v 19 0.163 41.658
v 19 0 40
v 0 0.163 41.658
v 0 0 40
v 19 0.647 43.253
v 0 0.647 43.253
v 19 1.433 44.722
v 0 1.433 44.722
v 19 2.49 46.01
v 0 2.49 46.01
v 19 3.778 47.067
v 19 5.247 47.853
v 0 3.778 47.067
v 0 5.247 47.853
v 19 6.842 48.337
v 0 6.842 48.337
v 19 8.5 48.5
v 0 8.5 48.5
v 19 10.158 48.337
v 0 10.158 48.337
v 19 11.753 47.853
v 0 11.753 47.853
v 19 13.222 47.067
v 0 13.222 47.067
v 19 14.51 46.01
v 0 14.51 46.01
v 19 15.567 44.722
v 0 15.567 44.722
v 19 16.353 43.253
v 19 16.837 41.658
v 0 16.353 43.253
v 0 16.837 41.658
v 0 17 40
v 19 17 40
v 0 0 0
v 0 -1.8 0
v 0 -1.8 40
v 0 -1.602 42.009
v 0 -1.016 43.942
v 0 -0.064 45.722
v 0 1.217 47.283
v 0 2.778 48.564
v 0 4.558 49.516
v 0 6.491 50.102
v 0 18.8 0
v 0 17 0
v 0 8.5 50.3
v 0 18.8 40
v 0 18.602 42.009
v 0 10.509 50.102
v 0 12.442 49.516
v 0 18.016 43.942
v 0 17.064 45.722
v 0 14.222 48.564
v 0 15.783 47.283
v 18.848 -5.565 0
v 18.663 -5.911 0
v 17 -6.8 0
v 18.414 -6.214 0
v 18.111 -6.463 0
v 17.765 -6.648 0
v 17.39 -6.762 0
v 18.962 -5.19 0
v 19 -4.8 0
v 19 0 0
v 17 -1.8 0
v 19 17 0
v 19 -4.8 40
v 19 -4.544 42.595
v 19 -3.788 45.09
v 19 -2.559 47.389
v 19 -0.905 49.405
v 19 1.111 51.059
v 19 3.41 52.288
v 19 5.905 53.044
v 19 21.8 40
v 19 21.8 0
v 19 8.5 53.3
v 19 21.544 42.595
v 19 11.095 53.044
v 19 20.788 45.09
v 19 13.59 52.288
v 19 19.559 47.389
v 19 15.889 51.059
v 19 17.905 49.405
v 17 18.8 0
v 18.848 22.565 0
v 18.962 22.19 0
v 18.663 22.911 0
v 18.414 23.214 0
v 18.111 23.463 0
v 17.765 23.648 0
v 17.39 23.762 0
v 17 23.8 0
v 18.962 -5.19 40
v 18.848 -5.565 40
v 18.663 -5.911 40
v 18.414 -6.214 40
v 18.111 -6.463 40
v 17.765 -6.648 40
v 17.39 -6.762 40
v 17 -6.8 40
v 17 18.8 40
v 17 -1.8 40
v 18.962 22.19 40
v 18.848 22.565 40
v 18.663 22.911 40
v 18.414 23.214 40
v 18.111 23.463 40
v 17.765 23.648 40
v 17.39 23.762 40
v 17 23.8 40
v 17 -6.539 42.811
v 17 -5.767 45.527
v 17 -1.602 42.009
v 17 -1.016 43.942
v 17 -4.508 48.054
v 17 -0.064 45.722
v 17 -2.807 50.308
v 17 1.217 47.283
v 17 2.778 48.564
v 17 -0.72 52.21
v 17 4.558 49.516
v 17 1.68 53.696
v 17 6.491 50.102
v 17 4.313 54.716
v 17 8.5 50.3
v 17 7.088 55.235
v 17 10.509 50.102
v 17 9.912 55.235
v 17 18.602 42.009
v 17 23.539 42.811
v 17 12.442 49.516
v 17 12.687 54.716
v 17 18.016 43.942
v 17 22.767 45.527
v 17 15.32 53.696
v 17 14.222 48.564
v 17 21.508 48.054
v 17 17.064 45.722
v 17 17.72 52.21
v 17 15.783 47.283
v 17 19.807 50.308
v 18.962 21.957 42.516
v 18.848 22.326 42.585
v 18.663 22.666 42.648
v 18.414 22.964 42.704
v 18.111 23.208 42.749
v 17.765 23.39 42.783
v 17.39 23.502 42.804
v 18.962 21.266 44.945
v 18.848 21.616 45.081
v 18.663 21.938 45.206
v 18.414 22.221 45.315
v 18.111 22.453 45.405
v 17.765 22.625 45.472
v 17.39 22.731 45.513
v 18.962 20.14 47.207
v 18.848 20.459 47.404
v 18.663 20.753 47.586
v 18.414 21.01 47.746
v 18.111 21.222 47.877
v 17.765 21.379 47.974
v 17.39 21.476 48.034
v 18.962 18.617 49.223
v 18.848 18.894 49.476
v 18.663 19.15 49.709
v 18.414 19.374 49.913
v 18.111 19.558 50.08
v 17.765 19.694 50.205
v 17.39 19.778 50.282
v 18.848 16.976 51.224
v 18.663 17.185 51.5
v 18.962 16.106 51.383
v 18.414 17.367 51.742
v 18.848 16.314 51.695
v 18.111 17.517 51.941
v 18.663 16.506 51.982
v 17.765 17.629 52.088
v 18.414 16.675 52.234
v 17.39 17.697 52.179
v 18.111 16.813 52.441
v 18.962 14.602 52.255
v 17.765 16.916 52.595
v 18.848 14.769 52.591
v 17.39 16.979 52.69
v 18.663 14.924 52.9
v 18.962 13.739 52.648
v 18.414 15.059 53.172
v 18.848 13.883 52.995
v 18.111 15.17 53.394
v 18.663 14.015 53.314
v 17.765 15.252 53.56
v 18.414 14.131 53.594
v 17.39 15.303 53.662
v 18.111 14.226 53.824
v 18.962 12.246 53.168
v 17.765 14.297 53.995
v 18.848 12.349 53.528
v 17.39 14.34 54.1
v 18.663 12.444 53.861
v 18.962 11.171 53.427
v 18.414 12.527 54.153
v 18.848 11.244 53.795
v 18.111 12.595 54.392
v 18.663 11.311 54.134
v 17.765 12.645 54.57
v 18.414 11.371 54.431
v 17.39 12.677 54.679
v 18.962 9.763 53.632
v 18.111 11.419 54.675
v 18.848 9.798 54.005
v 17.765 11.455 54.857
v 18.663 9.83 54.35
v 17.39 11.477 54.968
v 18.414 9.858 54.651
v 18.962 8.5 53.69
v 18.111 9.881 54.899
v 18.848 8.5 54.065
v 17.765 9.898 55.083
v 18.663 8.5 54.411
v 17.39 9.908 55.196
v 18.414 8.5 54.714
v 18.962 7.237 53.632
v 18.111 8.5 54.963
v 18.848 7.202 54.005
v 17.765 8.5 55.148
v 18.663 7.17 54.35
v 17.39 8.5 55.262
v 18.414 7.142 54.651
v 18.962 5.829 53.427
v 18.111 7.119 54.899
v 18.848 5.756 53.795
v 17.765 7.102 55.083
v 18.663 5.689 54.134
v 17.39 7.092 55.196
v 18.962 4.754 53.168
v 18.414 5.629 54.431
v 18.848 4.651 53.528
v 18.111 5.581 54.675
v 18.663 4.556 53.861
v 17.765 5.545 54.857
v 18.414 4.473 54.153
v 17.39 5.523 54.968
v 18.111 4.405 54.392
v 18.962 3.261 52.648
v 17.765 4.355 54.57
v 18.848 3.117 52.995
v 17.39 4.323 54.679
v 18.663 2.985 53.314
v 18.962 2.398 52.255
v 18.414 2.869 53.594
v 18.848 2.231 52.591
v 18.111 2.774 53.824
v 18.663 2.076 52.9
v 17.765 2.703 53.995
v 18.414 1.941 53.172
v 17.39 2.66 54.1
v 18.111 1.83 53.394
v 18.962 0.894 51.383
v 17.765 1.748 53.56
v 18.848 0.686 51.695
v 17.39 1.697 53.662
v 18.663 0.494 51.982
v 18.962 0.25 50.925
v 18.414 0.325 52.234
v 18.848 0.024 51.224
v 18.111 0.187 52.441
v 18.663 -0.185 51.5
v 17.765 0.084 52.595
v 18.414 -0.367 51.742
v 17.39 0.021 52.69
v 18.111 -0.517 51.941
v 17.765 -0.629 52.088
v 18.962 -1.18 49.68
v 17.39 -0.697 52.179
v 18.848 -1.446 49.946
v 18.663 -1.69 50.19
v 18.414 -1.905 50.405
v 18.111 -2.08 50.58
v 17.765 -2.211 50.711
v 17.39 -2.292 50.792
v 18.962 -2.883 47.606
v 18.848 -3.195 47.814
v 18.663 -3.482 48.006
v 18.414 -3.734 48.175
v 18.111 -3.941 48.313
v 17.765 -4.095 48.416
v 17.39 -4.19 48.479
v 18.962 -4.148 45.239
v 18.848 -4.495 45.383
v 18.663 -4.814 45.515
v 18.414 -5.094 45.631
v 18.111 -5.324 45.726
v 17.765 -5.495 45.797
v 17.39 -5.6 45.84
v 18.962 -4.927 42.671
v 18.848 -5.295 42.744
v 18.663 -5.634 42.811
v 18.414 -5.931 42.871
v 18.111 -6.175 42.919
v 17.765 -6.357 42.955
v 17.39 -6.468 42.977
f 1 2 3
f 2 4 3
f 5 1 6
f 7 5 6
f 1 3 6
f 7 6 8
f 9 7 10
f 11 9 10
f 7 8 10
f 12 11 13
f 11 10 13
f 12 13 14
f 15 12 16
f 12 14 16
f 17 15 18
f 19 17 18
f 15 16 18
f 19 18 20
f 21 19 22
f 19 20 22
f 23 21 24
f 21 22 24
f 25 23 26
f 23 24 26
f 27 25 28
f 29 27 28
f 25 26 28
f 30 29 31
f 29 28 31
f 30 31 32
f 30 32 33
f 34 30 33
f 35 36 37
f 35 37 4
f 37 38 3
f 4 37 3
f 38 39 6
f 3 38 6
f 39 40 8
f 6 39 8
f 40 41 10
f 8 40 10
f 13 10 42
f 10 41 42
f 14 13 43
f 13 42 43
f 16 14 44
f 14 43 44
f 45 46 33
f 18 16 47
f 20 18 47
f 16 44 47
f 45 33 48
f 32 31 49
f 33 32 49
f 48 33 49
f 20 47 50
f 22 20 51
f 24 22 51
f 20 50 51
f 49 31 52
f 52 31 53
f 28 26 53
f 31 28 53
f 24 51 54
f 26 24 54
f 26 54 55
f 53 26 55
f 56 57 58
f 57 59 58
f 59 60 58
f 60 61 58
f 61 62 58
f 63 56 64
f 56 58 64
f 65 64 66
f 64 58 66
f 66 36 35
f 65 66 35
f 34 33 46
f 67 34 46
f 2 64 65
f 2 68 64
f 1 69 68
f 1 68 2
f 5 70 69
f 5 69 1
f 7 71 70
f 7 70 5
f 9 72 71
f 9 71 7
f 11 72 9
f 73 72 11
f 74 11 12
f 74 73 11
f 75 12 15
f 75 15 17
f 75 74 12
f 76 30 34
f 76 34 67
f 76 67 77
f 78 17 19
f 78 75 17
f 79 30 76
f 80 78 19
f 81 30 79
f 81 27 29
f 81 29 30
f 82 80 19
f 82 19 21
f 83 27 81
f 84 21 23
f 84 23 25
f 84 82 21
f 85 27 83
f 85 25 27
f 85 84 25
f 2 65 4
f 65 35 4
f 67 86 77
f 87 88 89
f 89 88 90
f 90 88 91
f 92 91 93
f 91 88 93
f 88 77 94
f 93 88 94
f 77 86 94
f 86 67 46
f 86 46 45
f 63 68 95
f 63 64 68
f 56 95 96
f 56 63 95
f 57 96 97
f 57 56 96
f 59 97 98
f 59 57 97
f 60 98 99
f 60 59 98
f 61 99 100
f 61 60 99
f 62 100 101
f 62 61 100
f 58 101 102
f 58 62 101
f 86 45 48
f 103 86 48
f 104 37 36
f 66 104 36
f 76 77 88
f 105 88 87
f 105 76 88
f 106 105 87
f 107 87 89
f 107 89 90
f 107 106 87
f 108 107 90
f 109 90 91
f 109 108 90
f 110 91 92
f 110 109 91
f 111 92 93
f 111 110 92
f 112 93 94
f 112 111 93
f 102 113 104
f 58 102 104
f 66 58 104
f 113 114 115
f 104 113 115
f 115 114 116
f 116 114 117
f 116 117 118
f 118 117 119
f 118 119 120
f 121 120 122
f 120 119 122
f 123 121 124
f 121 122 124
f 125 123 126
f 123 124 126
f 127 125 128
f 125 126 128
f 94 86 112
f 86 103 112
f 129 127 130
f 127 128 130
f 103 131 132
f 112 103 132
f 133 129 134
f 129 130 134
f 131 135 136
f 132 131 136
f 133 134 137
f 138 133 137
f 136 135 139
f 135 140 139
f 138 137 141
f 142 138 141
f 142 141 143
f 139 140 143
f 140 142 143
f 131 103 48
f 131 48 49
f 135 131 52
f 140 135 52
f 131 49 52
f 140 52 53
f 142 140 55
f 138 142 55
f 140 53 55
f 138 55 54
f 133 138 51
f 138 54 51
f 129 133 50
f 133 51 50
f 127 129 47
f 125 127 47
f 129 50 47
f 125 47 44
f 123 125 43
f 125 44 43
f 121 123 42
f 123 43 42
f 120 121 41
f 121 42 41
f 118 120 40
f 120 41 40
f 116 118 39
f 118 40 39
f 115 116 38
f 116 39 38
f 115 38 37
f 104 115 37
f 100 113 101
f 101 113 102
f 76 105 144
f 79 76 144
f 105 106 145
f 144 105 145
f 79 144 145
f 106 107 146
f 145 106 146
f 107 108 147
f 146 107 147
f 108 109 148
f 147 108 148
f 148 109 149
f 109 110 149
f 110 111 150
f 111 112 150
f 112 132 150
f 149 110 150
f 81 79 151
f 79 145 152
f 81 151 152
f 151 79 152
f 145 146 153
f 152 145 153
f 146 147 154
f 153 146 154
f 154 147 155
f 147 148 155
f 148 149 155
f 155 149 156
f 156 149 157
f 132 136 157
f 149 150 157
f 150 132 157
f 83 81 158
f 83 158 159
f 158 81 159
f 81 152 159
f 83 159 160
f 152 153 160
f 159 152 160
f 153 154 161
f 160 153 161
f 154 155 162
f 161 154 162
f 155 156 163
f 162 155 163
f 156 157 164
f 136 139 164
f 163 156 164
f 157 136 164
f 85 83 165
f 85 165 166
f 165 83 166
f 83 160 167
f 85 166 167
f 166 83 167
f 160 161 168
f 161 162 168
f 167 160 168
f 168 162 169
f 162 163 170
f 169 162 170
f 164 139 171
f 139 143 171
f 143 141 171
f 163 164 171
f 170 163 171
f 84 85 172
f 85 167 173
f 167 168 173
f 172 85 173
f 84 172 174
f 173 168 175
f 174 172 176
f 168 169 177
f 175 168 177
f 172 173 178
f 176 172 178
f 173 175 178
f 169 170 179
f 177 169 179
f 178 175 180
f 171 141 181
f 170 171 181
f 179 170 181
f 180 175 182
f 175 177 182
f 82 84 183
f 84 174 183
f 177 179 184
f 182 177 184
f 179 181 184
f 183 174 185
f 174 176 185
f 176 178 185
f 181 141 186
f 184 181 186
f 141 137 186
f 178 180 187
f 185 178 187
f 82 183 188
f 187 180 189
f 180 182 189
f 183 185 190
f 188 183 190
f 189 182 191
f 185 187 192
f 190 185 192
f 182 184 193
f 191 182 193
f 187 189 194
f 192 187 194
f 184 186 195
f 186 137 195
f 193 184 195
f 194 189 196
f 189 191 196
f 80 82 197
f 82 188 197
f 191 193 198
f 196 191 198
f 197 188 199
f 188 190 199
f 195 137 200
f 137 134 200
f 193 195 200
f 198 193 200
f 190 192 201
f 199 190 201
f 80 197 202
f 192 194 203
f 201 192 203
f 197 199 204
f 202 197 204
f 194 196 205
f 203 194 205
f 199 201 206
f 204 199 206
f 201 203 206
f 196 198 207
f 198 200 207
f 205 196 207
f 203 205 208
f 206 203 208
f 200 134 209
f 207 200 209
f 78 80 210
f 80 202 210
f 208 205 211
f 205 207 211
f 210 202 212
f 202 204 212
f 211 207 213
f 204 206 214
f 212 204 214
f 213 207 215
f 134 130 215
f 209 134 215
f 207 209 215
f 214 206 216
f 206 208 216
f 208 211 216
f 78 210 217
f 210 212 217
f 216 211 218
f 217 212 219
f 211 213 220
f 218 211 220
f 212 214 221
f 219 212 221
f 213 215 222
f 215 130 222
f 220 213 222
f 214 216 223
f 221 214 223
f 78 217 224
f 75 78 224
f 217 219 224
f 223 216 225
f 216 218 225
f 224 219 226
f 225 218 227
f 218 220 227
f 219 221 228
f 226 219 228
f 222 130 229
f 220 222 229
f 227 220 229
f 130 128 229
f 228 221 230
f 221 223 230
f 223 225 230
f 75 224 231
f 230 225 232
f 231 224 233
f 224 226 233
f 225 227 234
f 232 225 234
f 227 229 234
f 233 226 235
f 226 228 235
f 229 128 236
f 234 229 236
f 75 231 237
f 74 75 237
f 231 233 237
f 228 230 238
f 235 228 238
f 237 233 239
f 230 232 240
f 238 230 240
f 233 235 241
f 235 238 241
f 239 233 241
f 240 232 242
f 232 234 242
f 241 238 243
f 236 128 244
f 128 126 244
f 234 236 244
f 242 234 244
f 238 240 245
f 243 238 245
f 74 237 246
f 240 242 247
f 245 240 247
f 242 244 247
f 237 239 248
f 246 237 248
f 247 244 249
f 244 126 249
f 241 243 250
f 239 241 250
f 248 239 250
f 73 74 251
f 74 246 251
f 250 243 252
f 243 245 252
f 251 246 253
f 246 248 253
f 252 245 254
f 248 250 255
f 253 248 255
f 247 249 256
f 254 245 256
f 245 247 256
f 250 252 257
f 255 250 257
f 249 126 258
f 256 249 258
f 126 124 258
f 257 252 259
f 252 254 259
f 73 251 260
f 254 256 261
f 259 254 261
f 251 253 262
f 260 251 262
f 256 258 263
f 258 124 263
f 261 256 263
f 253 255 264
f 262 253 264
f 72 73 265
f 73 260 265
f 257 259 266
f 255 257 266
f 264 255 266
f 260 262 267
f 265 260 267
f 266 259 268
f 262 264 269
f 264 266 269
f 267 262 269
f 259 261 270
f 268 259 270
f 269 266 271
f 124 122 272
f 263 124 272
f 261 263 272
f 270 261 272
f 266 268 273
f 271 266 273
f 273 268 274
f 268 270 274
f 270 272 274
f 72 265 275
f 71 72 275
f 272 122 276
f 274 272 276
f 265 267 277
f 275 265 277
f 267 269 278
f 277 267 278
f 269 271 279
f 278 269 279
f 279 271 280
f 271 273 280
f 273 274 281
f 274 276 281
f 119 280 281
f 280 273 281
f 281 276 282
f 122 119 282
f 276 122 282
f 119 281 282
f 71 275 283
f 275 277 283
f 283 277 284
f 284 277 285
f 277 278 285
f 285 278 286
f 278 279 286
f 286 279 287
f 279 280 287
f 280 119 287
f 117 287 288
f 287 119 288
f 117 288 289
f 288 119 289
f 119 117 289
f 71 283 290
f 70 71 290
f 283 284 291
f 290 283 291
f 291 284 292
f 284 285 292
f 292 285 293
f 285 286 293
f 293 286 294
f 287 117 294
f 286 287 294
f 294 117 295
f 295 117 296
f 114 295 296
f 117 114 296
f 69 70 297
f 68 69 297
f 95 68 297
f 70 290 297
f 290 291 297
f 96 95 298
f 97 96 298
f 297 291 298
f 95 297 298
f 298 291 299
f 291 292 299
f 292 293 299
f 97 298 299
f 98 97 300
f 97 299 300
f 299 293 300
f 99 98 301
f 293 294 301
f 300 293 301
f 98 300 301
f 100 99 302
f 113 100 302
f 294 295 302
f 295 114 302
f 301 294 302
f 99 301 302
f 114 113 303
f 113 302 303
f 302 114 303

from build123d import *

# Parameters (mm, degrees)
F1_DEPTH = 17
F3_DEPTH = 2
F4_R     = 1.99999


# Not quite as in the source:
# - a fillet or chamfer is up to 0.001 mm smaller than in the source, because OpenCascade refuses the exact size
# - a feature of the source that left no trace in its solid (it failed there, or was rolled back) is left out


with BuildPart() as f1:
    # F0 (on Right) → F1 (new body)
    with BuildSketch(Plane.YZ):
        with BuildLine():
            Line((-1.8, 0), (0, 0))
            Line((0, 0), (0, 40))
            ThreePointArc((0, 40), (8.5, 48.5), (17, 40))
            Line((17, 40), (17, 0))
            Line((17, 0), (18.8, 0))
            Line((18.8, 0), (18.8, 40))
            ThreePointArc((18.8, 40), (8.5, 50.3), (-1.8, 40))
            Line((-1.8, 40), (-1.8, 0))
        make_face()
    extrude(amount=F1_DEPTH)

    # F2 (on face) → F3 (join)
    with BuildSketch(Plane.YZ.offset(17)):
        with BuildLine():
            ThreePointArc((-1.8, 40), (8.5, 50.3), (18.8, 40))
            Line((18.8, 40), (18.8, 0))
            Line((18.8, 0), (23.8, 0))
            Line((23.8, 0), (23.8, 40))
            ThreePointArc((23.8, 40), (8.5, 55.3), (-6.8, 40))
            Line((-6.8, 40), (-6.8, 0))
            Line((-6.8, 0), (-1.8, 0))
            Line((-1.8, 0), (-1.8, 40))
        make_face()
        with BuildLine():
            Line((18.8, 0), (18.8, 40))
            ThreePointArc((18.8, 40), (8.5, 50.3), (-1.8, 40))
            Line((-1.8, 40), (-1.8, 0))
            Line((-1.8, 0), (0, 0))
            Line((0, 0), (0, 40))
            ThreePointArc((0, 40), (8.5, 48.5), (17, 40))
            Line((17, 40), (17, 0))
            Line((17, 0), (18.8, 0))
        make_face()
    extrude(amount=F3_DEPTH)

    # F4 (radius 2 in the source; OpenCascade refuses exactly that, so slightly less here)
    f4_edges = [f1.edges().sort_by_distance(p)[0] for p in [
        (19, -6.8, 20),
        (19, 8.5, 55.3),
        (19, 23.8, 20),
    ]]
    fillet(f4_edges, radius=F4_R)


solid = f1.part
